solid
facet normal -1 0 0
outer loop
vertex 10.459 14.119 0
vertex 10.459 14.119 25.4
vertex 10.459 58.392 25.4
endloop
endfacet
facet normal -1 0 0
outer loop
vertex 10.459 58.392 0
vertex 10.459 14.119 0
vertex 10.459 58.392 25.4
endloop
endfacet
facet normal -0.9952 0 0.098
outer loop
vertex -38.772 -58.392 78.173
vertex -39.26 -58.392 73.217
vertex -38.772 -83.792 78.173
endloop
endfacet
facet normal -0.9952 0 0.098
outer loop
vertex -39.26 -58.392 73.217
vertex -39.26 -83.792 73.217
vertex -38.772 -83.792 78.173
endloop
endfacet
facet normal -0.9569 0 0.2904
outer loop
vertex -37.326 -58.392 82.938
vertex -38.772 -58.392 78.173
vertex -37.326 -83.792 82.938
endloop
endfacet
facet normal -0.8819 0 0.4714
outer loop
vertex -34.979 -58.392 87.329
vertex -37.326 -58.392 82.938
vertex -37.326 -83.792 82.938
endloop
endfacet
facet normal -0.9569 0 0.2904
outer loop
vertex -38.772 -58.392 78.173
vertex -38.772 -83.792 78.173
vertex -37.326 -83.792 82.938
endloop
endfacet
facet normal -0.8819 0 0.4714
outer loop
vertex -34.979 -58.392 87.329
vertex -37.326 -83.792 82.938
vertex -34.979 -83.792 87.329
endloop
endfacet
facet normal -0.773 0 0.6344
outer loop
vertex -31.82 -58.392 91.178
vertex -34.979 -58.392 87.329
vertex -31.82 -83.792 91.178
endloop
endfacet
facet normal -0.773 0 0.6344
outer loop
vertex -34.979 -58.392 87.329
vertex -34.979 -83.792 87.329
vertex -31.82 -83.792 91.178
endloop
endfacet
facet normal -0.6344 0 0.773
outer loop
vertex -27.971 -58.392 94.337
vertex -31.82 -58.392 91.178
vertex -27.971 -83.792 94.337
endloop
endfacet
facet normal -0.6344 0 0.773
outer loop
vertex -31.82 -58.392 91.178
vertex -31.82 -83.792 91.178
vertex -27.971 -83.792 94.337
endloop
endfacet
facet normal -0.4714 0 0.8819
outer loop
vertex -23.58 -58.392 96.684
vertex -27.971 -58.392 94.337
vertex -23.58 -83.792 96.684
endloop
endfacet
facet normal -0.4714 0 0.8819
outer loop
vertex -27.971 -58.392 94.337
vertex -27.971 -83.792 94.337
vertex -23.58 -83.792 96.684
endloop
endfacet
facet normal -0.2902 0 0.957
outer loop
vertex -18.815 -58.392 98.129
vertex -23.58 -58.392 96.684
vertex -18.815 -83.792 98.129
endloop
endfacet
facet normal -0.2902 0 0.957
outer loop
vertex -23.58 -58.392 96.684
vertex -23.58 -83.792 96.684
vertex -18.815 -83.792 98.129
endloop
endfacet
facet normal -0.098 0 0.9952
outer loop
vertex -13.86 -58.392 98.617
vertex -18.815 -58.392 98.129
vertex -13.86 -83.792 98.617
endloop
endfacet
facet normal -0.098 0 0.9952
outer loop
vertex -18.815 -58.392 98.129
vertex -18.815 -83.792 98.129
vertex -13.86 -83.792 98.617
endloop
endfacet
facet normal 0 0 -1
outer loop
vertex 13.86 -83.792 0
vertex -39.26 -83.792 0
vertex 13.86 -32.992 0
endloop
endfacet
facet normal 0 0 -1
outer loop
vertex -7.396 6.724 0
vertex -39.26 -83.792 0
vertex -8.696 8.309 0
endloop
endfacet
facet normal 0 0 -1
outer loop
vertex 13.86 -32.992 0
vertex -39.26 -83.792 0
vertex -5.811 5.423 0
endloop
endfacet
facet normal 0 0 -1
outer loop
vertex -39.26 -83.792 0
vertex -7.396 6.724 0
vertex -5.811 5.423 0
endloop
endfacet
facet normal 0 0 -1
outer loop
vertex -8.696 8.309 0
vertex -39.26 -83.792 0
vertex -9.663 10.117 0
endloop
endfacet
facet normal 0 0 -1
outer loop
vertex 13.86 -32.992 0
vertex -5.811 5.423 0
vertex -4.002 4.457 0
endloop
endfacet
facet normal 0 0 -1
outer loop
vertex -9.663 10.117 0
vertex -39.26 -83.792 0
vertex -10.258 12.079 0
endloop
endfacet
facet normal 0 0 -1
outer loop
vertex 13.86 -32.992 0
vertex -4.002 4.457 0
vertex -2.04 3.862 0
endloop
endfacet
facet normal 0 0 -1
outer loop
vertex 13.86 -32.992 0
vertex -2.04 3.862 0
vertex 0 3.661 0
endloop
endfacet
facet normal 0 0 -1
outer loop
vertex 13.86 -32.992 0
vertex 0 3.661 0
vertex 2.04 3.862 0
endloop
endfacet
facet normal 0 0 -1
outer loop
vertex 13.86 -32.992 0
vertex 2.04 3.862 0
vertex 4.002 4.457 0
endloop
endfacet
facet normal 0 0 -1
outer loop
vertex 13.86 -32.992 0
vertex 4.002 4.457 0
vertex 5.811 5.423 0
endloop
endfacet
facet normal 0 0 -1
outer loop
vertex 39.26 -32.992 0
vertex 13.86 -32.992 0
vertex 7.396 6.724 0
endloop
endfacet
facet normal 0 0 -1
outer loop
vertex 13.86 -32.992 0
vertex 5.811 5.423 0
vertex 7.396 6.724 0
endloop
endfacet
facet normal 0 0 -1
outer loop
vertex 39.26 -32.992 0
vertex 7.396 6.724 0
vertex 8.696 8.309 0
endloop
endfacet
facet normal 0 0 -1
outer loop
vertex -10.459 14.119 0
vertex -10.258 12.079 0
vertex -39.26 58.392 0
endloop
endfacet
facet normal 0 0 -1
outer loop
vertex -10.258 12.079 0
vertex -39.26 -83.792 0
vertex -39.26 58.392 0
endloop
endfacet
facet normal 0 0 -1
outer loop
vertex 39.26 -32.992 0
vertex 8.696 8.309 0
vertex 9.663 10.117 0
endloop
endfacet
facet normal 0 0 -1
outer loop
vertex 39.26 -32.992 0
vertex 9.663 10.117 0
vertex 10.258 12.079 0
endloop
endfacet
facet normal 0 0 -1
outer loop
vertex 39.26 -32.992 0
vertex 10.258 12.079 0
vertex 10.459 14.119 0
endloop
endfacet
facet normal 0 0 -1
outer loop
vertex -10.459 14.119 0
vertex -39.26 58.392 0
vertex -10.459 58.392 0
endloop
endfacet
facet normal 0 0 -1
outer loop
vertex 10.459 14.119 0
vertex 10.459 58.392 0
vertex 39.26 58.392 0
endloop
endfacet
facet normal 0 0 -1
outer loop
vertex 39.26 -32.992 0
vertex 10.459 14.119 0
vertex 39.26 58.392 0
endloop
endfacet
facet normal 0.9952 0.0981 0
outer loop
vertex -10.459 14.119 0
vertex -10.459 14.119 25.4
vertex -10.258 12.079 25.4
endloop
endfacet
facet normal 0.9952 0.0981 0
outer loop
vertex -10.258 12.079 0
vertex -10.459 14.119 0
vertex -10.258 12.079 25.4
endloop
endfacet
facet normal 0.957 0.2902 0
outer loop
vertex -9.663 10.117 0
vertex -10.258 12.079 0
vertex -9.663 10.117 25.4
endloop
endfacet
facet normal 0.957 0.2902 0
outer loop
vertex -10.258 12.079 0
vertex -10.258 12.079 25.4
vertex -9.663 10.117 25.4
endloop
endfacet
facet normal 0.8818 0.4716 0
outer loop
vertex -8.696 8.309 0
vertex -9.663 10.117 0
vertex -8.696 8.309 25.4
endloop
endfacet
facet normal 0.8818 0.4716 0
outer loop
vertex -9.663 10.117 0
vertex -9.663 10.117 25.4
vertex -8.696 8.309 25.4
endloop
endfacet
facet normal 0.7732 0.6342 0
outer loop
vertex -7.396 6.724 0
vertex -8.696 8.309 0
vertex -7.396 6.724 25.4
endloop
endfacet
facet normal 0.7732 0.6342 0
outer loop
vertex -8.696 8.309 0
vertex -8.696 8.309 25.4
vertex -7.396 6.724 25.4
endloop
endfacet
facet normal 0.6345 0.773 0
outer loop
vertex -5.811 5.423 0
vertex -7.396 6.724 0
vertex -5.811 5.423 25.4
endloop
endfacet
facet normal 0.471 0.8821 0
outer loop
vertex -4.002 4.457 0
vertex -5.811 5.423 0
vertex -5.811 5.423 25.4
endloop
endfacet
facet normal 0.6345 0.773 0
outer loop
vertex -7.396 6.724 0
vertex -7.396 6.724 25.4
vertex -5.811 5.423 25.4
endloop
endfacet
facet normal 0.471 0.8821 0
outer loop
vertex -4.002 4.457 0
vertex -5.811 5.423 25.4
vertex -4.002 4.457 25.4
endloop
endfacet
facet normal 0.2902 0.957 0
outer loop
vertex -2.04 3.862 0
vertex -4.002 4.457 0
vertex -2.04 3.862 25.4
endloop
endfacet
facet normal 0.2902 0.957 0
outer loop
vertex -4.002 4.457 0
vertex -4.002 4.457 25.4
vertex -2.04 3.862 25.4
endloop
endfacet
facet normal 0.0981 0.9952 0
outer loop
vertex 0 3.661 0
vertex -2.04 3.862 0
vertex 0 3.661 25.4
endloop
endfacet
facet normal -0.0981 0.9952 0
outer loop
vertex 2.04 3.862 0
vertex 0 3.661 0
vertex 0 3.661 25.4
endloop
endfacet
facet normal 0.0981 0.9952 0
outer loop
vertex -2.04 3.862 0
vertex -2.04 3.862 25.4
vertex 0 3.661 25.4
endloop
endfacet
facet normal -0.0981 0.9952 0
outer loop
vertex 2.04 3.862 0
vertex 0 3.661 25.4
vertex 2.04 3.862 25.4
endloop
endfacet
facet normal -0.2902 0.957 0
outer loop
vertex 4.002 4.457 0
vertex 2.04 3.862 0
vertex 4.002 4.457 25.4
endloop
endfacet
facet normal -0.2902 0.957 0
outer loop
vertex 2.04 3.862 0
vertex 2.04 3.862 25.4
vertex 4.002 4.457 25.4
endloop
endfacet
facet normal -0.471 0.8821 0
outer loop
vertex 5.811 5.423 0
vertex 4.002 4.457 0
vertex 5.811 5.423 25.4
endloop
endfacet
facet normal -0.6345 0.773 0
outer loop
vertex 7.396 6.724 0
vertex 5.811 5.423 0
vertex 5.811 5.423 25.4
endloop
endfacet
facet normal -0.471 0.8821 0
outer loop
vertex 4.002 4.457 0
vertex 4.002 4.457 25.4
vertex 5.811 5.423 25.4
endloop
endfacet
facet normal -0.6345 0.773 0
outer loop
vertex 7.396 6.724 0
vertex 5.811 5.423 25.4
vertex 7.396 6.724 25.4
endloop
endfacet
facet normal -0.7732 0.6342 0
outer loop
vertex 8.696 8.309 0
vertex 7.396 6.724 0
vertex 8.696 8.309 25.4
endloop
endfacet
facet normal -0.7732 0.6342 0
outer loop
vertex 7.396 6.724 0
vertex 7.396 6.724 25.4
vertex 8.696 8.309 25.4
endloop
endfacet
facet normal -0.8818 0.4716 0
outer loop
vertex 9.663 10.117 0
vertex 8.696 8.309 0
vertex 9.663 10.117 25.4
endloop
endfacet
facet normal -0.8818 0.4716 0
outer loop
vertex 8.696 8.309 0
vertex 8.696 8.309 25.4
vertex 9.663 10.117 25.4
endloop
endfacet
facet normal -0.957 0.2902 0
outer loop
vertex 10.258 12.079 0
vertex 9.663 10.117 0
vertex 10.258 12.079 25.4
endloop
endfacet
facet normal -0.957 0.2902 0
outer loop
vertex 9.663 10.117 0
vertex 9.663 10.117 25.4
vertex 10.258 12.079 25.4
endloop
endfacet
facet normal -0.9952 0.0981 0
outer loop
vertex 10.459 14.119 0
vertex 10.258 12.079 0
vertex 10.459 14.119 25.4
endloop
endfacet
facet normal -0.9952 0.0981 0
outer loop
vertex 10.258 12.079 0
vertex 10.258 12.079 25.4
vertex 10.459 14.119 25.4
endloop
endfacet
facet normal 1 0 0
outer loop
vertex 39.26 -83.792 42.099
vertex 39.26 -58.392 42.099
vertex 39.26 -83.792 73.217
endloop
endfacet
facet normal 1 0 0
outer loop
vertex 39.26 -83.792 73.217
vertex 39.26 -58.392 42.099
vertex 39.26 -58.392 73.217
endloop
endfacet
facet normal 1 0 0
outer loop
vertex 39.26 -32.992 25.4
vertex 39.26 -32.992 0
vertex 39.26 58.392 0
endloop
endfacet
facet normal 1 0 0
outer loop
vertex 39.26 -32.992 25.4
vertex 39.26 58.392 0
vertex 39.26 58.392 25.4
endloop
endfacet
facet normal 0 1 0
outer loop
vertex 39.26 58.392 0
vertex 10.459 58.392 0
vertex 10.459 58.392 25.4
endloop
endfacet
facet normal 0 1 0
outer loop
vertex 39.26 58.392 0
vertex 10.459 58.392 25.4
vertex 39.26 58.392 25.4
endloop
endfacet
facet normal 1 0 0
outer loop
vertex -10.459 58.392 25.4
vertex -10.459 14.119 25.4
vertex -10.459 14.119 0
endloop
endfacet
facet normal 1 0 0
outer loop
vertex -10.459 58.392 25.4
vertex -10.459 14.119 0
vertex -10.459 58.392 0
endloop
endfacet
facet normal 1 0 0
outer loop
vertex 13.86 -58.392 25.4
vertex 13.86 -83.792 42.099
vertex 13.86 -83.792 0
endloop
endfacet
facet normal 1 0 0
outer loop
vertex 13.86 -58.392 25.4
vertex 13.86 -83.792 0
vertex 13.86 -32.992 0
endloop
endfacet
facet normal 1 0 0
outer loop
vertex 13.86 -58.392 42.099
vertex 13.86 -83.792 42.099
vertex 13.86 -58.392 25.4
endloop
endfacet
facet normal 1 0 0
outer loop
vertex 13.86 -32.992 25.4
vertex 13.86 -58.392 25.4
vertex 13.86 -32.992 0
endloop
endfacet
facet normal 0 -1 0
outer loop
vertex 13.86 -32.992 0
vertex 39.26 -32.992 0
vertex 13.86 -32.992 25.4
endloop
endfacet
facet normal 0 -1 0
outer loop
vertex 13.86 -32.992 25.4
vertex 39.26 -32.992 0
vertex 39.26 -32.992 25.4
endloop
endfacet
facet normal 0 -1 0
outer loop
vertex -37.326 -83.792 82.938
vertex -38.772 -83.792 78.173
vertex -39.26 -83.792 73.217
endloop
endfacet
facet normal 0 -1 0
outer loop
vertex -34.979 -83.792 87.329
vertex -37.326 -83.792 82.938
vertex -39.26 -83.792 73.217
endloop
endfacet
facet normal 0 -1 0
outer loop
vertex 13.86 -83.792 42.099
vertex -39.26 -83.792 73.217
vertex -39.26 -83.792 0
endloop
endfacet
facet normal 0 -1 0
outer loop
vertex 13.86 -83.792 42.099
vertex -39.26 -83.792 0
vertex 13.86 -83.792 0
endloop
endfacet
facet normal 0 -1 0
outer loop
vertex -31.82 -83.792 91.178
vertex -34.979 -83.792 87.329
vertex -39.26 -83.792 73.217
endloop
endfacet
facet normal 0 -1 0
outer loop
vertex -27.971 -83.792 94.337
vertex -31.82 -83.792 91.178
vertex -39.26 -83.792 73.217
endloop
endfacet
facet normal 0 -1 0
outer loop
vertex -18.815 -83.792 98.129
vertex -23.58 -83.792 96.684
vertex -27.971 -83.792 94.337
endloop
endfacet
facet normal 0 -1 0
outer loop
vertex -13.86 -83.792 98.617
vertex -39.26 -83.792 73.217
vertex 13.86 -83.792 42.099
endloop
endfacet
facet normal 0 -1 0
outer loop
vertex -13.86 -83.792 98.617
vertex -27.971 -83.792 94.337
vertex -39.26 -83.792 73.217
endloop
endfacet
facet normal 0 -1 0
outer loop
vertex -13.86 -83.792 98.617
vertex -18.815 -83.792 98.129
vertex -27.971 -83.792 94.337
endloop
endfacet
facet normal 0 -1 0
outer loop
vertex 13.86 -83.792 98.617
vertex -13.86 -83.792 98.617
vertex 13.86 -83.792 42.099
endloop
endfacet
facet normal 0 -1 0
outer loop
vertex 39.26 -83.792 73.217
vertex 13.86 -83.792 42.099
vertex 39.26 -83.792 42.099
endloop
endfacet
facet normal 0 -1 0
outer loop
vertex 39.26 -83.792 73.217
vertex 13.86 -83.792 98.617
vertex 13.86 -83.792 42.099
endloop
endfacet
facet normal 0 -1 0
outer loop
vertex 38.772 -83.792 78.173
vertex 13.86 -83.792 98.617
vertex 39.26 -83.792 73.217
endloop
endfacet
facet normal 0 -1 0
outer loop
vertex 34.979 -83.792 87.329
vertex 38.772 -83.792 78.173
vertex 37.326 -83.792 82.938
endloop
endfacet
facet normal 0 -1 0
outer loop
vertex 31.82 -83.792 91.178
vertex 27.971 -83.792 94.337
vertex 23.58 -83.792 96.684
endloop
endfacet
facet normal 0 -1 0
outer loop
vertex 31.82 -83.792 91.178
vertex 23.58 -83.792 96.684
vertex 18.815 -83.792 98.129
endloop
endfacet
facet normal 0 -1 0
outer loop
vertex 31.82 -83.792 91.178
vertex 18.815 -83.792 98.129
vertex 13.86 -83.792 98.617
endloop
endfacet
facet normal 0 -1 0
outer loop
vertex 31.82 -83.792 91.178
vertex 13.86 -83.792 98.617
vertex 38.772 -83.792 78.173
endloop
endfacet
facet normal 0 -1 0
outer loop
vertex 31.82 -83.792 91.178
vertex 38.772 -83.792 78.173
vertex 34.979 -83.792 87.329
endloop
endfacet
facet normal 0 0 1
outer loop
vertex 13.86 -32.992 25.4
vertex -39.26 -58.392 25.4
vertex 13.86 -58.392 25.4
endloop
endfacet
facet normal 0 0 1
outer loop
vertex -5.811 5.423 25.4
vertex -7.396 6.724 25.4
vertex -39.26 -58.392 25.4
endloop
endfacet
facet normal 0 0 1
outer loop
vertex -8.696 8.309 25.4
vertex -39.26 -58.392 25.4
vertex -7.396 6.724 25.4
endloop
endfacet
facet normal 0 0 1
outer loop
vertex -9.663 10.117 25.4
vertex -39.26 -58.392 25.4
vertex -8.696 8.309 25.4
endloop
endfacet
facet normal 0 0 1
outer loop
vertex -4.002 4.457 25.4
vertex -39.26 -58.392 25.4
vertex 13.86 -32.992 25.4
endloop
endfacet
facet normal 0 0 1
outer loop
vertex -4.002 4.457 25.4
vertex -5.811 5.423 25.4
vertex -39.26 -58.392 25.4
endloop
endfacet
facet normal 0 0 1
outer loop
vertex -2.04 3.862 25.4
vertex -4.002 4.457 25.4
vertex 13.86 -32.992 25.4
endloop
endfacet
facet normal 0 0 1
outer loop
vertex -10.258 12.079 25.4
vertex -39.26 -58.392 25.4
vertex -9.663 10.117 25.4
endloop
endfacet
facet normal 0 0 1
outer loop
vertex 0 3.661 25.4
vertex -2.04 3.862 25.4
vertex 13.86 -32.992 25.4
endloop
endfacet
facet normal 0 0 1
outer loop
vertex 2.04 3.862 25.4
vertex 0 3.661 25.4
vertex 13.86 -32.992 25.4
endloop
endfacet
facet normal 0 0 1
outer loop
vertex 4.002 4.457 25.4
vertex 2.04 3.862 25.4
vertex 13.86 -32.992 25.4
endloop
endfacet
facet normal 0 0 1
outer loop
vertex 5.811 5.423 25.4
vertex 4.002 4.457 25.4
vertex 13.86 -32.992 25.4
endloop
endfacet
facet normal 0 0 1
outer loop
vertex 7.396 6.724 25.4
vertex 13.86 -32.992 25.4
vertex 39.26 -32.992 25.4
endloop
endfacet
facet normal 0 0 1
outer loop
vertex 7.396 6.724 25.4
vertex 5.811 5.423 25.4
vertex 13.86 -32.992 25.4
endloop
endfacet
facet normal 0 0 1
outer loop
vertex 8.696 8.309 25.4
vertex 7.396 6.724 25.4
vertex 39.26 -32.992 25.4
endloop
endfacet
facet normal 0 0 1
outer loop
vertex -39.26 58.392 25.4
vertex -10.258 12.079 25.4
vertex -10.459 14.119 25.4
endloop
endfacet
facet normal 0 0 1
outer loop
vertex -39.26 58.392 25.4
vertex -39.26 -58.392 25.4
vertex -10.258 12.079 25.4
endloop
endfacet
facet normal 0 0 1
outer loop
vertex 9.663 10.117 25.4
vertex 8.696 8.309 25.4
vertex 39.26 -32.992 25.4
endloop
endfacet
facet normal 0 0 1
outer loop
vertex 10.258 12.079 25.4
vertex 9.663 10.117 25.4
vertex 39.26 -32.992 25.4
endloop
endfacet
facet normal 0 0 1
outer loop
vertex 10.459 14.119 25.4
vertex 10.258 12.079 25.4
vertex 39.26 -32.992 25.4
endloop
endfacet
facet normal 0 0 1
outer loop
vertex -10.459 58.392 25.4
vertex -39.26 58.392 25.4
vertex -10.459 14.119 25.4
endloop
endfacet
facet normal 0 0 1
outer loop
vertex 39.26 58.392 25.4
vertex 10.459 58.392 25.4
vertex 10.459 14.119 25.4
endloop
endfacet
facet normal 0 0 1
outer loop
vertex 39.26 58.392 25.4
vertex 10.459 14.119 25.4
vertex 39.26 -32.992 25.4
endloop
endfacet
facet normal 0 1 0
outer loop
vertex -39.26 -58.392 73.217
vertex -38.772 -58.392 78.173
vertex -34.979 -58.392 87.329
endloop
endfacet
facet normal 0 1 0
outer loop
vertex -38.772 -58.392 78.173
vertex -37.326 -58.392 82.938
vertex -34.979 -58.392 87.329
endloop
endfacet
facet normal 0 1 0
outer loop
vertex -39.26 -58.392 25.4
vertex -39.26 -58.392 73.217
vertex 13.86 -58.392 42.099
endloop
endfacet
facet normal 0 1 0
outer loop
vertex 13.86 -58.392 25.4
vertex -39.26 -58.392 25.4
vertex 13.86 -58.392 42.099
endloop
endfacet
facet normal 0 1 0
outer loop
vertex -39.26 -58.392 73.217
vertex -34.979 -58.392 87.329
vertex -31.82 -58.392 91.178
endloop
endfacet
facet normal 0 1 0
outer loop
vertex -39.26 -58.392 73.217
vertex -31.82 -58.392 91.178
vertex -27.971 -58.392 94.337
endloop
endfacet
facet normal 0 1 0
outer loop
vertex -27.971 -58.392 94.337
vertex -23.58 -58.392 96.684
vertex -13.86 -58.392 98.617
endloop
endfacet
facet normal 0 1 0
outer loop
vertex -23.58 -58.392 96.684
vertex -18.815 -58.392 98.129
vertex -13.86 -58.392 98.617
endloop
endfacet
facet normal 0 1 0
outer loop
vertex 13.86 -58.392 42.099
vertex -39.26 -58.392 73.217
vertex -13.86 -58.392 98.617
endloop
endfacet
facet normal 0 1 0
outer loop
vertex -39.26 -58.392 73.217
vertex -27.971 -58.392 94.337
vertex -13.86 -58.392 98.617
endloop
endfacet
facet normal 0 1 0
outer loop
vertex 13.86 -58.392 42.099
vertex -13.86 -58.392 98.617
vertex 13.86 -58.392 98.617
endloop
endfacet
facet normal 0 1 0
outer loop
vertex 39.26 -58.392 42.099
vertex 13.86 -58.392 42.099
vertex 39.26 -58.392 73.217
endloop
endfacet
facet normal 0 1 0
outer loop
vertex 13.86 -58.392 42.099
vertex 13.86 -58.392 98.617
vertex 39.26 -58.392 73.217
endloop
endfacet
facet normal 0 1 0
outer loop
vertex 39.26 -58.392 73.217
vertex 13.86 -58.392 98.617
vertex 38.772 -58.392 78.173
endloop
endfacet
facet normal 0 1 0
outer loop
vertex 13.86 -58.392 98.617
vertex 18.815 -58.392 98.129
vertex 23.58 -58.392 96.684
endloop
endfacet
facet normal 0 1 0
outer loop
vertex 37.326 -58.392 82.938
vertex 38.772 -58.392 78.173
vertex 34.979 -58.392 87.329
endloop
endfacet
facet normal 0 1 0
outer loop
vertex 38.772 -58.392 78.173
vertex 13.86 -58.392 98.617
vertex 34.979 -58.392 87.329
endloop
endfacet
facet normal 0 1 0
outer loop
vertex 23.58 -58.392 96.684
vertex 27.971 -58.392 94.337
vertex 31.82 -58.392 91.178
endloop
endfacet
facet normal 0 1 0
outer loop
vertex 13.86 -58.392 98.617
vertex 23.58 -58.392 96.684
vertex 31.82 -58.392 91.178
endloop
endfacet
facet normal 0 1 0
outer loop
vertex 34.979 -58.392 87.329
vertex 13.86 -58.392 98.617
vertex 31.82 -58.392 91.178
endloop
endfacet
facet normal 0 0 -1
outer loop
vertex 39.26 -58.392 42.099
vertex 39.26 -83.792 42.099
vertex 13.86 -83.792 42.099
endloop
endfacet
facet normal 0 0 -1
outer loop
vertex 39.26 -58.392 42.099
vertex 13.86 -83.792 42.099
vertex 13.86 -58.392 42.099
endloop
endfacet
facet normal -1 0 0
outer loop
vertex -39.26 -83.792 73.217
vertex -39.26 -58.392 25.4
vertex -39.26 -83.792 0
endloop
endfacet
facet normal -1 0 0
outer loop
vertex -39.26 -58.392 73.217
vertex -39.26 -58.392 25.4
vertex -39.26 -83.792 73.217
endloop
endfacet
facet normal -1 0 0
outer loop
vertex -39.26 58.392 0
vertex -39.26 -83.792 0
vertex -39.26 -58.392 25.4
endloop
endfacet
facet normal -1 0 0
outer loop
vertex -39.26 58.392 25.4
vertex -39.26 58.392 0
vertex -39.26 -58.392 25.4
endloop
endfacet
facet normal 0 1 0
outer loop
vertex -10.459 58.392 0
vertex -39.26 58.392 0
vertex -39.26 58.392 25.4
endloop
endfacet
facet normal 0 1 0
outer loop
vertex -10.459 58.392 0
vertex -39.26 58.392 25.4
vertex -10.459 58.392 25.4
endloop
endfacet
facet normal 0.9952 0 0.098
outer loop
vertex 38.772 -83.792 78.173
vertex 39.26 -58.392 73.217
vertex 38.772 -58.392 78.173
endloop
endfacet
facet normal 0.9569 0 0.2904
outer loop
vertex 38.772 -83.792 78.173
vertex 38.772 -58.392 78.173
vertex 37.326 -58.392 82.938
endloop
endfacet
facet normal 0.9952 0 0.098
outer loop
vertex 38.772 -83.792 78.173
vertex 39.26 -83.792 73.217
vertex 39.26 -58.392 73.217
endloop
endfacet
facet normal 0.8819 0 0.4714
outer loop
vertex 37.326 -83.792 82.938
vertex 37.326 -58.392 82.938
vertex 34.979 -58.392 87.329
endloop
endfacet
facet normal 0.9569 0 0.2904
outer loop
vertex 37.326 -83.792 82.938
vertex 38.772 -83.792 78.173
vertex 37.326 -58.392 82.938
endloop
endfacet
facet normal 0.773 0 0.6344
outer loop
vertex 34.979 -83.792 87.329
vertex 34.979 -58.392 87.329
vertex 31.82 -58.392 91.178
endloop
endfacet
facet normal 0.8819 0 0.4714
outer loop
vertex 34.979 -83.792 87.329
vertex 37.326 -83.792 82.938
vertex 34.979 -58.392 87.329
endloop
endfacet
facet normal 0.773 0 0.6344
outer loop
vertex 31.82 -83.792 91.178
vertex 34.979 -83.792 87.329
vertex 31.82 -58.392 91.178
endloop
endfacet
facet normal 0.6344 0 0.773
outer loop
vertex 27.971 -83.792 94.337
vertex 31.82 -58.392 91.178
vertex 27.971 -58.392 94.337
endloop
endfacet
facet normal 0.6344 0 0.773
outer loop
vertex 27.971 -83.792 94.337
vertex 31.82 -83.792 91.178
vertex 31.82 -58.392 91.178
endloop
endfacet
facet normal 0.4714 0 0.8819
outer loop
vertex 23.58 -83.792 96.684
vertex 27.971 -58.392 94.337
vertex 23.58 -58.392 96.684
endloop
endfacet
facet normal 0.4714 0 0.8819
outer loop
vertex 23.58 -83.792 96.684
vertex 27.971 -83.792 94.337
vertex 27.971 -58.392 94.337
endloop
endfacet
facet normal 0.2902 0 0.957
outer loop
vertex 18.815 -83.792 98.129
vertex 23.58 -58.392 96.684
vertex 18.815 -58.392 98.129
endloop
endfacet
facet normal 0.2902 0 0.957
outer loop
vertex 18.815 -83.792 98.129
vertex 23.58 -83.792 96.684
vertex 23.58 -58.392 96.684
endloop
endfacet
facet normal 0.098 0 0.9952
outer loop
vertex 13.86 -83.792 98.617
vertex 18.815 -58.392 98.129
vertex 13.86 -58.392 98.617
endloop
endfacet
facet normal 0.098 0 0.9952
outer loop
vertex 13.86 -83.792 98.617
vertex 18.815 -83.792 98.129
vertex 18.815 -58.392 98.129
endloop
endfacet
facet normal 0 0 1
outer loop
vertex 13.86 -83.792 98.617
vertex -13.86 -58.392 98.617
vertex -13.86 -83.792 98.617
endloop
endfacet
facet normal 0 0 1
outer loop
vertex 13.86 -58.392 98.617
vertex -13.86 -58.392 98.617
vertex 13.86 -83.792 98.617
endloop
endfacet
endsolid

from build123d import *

# Parameters (mm, degrees)
F0_W      = 78.519128263
F0_H      = 116.7847812176
F1_DEPTH  = 25.4
F2_W      = 20.9176447242
F2_H      = 88.5459557176
F3_DEPTH  = 25.401
F4_R      = 10.4588223621
F5_DEPTH  = 25.4
F6_W      = 78.519128263
F6_H      = 98.6174941063
F7_DEPTH  = 25.4
F8_R      = 25.4
F9_W      = 25.4
F9_H      = 42.0989841223
F10_DEPTH = 25.4
F11_DEPTH = 25.4


with BuildPart() as f1:
    # F0 (on Top) → F1 (new body)
    with BuildSketch(Plane.XY):
        Rectangle(F0_W, F0_H)
    extrude(amount=F1_DEPTH)

    # F2 (on face) → F3 (cut, through all)
    with BuildSketch(Plane.XY.offset(25.4)):
        with Locations((0, 58.3923906088)):
            Rectangle(F2_W, F2_H)
    extrude(amount=-F3_DEPTH, mode=Mode.SUBTRACT)

    # F4 (on face) → F5 (cut)
    with BuildSketch(Plane.XY.offset(25.4)):
        with Locations((0, 14.11941275)):
            Circle(F4_R)
    extrude(amount=-F5_DEPTH, mode=Mode.SUBTRACT)

    # F6 (on face) → F7 (join)
    with BuildSketch(Plane.XZ.offset(58.3923906088)):
        with Locations((0, 49.3087470531)):
            Rectangle(F6_W, F6_H)
    extrude(amount=F7_DEPTH)

    # F8
    f8_edges = [f1.edges().sort_by_distance(p)[0] for p in [
        (-39.259564, -71.092391, 98.617494),
        (39.259564, -71.092391, 98.617494),
    ]]
    fillet(f8_edges, radius=F8_R)

    # F9 (on face) → F10 (cut)
    with BuildSketch(Plane.YZ.offset(39.2595641315)):
        with Locations((-71.0923906088, 21.0494920611)):
            Rectangle(F9_W, F9_H)
    extrude(amount=-F10_DEPTH, mode=Mode.SUBTRACT)

    # F11 (cut): a face of the model
    f11_faces = [f1.faces().sort_by_distance(p)[0] for p in [
        (26.5595641315, -58.3923906088, 12.7),
    ]]
    extrude(f11_faces, amount=-F11_DEPTH, mode=Mode.SUBTRACT)


solid = f1.part
